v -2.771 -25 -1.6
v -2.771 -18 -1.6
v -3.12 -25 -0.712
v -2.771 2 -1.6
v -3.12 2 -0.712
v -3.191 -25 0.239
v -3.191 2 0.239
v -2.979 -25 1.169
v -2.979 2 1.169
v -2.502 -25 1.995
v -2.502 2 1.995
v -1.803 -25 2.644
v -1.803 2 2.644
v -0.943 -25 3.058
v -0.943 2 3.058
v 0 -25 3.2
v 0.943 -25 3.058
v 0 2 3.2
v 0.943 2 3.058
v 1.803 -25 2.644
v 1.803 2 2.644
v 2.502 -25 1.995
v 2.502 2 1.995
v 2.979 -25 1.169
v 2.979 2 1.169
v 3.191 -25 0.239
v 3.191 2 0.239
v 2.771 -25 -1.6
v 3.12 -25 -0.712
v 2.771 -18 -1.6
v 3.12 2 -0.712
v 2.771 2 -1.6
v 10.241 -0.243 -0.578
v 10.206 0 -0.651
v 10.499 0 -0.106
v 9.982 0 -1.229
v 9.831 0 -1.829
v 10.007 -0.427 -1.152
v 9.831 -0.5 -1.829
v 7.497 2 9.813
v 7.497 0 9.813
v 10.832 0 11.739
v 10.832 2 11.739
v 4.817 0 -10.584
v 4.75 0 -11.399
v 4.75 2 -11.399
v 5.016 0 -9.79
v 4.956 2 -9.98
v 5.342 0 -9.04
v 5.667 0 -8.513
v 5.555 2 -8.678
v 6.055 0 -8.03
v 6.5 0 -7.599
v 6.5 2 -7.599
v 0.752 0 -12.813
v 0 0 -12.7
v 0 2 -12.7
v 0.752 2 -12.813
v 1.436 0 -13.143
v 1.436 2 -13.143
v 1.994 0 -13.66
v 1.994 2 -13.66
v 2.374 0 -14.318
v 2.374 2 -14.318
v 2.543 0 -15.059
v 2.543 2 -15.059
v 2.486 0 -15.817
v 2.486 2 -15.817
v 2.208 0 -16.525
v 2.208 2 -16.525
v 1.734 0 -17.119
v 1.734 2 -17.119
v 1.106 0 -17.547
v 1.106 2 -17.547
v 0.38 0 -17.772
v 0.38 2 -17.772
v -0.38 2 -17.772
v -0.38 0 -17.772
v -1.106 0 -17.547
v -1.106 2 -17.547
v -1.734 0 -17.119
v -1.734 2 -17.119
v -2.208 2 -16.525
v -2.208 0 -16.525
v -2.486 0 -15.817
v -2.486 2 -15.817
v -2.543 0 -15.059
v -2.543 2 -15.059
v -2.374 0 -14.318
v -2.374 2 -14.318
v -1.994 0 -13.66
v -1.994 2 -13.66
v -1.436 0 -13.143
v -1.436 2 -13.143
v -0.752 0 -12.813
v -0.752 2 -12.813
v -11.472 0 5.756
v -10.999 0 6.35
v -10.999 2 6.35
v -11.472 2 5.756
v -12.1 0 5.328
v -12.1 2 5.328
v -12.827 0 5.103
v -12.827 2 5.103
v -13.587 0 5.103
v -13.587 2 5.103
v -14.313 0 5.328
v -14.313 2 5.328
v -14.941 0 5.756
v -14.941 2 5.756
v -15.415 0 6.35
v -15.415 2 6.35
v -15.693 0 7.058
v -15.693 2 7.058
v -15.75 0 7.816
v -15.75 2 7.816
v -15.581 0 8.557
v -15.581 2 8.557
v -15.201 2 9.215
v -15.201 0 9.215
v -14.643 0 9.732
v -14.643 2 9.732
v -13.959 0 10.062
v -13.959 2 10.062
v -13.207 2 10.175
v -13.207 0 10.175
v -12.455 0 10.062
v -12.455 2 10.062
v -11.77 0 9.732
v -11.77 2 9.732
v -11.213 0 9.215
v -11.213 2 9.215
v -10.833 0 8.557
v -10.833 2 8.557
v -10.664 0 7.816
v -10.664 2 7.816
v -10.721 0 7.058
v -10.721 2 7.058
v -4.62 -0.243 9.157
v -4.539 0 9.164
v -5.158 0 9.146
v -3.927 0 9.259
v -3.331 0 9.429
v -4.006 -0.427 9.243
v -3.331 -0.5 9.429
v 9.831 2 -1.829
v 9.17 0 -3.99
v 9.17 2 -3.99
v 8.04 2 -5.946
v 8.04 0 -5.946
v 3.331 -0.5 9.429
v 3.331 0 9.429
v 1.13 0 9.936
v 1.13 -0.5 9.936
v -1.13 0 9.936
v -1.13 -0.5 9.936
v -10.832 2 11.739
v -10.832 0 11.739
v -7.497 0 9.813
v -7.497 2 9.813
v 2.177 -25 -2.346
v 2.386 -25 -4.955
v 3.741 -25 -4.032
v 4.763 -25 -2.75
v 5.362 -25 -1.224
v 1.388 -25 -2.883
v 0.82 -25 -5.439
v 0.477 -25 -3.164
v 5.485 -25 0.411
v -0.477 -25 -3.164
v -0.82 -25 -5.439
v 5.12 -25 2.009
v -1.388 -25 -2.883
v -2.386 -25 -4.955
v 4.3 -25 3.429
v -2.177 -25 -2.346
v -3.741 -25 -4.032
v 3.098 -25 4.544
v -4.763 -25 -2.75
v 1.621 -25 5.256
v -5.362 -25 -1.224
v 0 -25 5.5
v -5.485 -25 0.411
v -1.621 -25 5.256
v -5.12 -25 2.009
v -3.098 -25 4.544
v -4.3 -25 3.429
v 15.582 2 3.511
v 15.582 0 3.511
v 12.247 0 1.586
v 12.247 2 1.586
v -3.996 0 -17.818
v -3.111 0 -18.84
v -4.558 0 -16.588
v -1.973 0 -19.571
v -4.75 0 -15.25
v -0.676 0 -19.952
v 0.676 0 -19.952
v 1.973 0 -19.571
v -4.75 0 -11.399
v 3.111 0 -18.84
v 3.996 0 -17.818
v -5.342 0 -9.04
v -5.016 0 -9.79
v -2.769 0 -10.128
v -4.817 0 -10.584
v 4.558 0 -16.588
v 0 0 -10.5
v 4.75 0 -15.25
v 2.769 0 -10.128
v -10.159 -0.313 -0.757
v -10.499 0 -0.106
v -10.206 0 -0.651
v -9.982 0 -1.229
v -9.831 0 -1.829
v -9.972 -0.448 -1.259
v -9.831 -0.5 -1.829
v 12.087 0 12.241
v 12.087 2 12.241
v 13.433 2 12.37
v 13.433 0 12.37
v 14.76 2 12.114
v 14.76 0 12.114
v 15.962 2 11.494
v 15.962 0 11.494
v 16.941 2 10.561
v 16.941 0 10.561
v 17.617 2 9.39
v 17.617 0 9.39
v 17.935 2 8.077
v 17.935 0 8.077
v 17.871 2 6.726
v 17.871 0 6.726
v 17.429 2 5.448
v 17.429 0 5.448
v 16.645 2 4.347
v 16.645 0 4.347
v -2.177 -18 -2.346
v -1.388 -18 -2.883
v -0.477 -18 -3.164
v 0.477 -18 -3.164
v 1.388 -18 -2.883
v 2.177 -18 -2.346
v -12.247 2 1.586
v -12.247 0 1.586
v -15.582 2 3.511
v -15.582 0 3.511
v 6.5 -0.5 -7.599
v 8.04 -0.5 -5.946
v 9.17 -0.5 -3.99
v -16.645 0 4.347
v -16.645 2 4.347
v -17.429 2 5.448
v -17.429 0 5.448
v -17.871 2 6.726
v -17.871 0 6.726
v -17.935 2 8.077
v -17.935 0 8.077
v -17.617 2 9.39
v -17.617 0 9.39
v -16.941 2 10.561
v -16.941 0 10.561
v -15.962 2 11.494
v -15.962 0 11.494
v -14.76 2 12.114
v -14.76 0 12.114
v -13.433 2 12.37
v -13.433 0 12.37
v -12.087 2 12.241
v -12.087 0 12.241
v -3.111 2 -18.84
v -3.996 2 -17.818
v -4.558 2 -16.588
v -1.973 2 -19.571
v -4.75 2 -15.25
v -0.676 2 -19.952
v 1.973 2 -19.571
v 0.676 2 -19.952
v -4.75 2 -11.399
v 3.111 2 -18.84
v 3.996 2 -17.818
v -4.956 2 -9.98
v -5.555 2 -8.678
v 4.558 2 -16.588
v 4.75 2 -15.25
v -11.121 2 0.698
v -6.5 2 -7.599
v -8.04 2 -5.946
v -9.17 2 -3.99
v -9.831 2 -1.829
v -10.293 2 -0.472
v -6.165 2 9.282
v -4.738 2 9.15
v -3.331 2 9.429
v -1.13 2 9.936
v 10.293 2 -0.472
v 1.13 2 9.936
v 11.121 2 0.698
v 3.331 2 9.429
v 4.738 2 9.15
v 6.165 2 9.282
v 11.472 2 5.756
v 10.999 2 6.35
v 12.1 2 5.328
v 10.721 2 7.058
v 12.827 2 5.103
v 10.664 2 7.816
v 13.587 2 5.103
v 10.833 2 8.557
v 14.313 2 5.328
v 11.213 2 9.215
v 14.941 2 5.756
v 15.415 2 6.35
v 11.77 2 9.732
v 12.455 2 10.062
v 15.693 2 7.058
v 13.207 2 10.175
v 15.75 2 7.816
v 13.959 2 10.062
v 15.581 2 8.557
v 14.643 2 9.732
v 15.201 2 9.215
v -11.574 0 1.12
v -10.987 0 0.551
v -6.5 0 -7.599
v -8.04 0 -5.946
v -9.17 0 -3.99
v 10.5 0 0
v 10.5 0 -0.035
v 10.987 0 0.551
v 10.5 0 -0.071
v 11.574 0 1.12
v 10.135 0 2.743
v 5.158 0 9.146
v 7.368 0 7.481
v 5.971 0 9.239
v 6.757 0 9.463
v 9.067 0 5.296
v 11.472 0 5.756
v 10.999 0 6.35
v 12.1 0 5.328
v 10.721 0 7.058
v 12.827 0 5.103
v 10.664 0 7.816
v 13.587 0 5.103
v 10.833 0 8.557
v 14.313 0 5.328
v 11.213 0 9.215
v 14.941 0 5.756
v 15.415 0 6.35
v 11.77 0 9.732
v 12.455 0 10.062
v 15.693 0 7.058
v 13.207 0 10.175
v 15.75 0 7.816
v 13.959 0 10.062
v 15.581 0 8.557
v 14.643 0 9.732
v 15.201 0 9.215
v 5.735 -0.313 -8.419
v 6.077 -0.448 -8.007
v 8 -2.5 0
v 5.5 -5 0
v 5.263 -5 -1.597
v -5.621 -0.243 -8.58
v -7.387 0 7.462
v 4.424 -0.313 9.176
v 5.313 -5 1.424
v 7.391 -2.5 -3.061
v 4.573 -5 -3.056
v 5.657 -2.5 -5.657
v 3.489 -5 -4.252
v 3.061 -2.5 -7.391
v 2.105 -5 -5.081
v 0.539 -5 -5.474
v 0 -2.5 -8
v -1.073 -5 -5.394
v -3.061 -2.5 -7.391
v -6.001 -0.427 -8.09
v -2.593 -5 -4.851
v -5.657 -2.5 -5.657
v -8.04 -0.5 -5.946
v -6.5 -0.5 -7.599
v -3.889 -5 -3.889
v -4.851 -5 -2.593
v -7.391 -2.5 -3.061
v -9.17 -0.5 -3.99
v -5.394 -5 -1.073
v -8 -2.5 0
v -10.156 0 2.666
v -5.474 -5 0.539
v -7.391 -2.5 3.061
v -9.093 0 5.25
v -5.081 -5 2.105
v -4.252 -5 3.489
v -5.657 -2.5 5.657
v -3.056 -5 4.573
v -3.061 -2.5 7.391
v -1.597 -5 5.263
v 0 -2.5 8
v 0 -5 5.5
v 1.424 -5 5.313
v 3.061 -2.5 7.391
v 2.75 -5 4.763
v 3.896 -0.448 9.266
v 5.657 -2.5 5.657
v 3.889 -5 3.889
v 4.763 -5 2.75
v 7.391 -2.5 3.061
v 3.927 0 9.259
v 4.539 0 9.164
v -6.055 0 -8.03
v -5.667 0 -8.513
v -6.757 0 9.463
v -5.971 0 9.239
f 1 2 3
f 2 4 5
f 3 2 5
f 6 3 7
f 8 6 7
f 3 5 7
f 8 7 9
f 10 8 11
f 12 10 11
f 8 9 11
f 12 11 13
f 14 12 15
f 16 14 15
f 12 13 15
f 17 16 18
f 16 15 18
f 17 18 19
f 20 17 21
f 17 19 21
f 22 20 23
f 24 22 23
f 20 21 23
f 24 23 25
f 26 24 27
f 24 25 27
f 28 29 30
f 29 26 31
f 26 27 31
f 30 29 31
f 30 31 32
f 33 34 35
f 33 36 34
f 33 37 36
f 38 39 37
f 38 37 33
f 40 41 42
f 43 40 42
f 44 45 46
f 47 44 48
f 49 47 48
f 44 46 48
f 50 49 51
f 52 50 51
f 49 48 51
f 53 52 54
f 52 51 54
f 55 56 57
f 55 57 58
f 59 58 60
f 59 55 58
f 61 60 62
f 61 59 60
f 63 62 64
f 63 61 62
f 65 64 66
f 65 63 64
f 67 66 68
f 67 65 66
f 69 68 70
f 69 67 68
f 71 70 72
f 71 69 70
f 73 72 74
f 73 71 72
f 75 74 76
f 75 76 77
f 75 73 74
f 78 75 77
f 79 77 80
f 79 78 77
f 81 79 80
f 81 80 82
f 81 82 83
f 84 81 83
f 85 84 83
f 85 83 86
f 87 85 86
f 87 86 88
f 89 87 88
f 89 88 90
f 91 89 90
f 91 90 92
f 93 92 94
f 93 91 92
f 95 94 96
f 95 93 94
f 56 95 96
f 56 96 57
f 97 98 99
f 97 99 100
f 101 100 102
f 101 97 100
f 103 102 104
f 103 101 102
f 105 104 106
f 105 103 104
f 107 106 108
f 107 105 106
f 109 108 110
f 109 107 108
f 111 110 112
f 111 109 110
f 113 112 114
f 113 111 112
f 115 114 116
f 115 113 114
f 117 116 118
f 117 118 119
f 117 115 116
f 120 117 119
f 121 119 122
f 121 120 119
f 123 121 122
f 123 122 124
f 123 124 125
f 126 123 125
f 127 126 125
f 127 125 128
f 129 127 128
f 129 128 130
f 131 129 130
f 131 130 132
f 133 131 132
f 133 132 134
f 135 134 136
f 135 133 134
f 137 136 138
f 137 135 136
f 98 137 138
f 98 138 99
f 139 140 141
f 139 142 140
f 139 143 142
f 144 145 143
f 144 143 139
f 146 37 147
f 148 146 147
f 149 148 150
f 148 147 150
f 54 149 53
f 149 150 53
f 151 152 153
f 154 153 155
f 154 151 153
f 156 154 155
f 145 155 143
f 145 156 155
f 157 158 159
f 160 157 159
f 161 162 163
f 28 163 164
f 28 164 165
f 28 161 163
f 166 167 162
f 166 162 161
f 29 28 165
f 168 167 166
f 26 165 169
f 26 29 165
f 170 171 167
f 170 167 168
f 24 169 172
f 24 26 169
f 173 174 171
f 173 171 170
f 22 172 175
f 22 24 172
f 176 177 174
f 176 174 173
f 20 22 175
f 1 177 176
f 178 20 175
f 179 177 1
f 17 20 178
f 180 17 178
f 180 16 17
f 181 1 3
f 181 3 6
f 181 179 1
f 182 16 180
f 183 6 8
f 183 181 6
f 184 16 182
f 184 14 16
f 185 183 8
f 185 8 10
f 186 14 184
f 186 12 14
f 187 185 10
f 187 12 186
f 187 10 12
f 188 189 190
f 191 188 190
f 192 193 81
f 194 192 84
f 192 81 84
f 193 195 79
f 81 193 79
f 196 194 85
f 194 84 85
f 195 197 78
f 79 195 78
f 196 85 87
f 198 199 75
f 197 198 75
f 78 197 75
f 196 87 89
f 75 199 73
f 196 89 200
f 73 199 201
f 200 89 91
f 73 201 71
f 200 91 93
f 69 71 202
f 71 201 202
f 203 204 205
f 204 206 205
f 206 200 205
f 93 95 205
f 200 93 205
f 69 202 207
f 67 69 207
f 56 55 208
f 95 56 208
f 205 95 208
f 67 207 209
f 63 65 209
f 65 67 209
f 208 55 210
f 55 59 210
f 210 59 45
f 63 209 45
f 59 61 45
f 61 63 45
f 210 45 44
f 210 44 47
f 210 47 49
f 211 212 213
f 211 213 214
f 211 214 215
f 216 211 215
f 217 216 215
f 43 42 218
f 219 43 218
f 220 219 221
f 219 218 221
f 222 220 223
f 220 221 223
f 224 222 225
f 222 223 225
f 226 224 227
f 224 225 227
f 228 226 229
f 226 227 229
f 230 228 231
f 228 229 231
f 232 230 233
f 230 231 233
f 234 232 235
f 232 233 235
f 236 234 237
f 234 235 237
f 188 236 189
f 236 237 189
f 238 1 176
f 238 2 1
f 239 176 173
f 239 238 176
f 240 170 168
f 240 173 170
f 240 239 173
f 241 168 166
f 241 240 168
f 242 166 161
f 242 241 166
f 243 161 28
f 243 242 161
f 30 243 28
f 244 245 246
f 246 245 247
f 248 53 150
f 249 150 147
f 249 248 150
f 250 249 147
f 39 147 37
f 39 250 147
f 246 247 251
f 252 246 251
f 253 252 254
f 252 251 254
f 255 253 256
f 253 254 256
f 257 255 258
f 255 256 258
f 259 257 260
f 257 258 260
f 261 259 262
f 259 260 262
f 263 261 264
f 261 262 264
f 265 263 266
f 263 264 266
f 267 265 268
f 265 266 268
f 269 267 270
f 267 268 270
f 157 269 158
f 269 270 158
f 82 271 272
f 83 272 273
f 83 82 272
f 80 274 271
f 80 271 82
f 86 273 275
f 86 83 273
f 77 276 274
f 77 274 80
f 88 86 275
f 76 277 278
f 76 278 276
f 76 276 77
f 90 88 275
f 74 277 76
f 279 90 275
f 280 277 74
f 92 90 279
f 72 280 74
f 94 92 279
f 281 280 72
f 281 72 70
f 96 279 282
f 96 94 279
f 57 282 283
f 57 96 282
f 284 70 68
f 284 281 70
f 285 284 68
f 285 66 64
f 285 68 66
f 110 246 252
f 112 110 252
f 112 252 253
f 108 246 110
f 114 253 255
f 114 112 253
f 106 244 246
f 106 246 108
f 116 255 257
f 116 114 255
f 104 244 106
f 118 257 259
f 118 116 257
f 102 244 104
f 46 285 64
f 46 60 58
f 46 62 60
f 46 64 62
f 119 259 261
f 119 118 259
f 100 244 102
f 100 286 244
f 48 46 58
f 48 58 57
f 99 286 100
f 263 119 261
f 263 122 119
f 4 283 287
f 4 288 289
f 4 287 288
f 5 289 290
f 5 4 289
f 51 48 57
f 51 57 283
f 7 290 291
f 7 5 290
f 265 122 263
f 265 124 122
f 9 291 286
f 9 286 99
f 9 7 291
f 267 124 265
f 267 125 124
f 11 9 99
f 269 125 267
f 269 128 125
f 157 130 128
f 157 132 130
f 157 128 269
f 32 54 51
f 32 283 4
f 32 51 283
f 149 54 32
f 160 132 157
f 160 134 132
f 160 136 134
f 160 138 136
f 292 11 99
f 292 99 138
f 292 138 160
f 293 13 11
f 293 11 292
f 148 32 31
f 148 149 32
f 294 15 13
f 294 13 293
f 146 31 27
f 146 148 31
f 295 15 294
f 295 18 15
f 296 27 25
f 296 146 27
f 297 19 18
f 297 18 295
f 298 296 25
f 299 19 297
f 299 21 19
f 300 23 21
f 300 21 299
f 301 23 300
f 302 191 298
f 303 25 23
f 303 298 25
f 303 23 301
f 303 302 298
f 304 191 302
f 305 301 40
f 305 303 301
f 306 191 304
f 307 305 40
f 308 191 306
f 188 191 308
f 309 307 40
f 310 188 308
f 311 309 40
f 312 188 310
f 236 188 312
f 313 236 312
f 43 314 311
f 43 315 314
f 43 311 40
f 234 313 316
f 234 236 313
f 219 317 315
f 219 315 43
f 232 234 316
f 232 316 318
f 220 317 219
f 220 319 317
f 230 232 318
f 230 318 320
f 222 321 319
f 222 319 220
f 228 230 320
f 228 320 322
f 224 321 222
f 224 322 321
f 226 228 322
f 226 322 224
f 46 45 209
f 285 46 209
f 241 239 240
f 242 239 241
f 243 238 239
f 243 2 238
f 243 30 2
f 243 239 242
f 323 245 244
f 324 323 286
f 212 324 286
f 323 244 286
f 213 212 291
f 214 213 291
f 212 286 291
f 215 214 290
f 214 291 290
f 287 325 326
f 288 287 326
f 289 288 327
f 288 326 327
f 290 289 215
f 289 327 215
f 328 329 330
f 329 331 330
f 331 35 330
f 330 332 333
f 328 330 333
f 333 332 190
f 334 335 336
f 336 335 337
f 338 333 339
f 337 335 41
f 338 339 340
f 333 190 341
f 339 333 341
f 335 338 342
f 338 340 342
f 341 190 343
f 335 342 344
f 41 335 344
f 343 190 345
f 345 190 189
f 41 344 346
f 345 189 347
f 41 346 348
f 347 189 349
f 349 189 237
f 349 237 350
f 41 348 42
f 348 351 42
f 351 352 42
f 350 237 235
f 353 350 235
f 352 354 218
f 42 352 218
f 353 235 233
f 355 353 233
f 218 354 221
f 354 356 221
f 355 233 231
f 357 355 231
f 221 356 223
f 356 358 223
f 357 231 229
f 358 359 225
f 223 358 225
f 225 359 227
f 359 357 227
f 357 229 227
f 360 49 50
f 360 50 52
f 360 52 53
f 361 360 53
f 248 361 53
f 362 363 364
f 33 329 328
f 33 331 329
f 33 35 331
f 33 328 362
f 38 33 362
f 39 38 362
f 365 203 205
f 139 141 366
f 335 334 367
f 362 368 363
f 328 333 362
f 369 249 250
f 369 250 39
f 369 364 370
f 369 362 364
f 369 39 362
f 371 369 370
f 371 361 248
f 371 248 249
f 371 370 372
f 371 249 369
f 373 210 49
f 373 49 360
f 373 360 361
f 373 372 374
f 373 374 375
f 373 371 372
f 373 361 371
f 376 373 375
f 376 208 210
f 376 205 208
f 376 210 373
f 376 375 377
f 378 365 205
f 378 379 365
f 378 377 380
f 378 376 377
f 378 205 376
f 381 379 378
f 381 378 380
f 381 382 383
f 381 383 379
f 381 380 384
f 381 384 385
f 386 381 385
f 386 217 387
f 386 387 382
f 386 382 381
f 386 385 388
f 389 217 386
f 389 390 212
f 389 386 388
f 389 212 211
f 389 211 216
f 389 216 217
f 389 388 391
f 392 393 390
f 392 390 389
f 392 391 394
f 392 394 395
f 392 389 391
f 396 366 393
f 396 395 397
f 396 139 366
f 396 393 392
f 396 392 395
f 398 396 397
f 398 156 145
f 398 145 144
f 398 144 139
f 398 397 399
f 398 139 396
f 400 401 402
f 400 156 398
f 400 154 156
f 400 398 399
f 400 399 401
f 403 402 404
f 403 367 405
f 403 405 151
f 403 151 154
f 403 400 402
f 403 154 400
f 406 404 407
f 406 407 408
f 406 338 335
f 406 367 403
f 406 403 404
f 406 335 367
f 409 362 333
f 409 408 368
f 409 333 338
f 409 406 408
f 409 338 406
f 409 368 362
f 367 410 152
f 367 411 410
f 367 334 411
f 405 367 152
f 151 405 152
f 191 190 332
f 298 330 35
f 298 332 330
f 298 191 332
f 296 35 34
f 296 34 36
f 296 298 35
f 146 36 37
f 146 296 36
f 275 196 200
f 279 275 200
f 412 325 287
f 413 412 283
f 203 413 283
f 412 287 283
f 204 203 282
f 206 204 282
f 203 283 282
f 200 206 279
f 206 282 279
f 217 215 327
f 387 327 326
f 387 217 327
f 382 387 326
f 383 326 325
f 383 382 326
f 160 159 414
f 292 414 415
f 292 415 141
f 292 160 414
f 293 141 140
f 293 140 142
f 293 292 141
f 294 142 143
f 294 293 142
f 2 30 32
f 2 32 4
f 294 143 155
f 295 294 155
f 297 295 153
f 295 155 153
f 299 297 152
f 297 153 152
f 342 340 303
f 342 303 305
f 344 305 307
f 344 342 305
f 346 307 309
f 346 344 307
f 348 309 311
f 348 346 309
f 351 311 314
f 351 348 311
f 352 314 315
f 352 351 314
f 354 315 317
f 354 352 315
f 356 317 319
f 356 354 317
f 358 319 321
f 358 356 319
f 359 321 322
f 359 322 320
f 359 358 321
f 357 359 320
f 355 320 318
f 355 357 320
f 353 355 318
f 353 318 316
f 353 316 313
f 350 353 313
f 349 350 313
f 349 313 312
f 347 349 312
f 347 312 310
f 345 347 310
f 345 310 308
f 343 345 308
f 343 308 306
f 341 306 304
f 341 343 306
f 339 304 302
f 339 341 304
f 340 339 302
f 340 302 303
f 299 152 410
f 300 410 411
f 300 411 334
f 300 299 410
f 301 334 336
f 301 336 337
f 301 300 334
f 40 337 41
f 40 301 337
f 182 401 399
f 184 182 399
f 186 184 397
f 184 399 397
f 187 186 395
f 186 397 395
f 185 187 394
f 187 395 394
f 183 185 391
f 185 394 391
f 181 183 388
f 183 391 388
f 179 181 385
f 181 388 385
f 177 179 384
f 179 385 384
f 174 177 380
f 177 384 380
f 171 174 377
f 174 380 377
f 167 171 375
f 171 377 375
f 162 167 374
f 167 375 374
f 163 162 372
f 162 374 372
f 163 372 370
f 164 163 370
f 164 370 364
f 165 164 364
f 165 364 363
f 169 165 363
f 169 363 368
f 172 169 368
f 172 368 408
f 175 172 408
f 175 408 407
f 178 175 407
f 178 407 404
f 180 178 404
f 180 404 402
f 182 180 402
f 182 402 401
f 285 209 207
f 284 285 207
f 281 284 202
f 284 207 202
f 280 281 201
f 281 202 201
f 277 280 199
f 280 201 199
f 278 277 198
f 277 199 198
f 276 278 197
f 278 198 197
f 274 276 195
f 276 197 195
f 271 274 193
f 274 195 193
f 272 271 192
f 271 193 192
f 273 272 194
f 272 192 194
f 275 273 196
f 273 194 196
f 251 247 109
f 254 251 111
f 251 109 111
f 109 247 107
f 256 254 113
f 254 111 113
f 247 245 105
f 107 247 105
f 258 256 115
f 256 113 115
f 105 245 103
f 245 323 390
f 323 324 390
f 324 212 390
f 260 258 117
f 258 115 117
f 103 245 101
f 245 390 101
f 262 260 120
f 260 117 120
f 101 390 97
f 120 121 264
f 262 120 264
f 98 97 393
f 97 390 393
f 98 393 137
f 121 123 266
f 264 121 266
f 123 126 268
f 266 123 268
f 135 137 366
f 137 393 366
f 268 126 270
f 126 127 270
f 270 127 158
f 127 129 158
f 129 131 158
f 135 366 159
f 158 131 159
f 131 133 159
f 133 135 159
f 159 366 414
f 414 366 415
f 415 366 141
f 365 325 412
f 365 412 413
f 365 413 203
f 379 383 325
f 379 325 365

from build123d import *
from build123d.topology import SkipClean

# Parameters (mm, degrees)
SKETCH1_R               = 10
BOSS_EXTRUDE1_DEPTH     = 2
BOSS_EXTRUDE2_START     = -2
SKETCH2_R               = 2.55
BOSS_EXTRUDE2_DEPTH     = 2
CIRPATTERN1_COUNT       = 3
CUT_EXTRUDE1_DEPTH      = 27.9527328
SKETCH4_R               = 5.5
BOSS_EXTRUDE3_DEPTH     = 25
CUT_EXTRUDE2_START      = -7
SKETCH5_R               = 3
CUT_EXTRUDE2_DEPTH      = 7
CUT_EXTRUDE3_DEPTH      = 34.502982037
CUT_EXTRUDE3_DEPTH_BACK = 34.502982037
CUT_EXTRUDE4_START      = -7
SKETCH8_R               = 3.2
CUT_EXTRUDE4_DEPTH      = 7
FILLET2_R               = 5
CHAMFER1_START          = -2
CHAMFER1_2_DEPTH        = 2


with BuildPart() as part:
    # Sketch1 → Boss-Extrude1 (new body)
    with BuildSketch(Plane(origin=(0, 0, 0), x_dir=(1, 0, 0), z_dir=(0, 1, 0))):
        with Locations(Location((0, 0, 0), (0, 0, 270))):
            Circle(SKETCH1_R)
    extrude(amount=BOSS_EXTRUDE1_DEPTH)

    # Sketch2 → Boss-Extrude2 (add)
    with BuildSketch(Plane(origin=(0, 2, 0), x_dir=(1, 0, 0), z_dir=(0, 1, 0)).offset(BOSS_EXTRUDE2_START)):
        with BuildLine():
            Line((-4.75, 15.25), (-4.75, 8.799857953))
            ThreePointArc((-4.75, 8.799857953), (0, 10), (4.75, 8.799857953))
            Line((4.75, 8.799857953), (4.75, 15.25))
            ThreePointArc((4.75, 15.25), (0, 20), (-4.75, 15.25))
        make_face()
        with Locations(Location((0, 15.25, 0), (0, 0, 270))):
            Circle(SKETCH2_R, mode=Mode.SUBTRACT)
    boss_extrude2 = extrude(amount=BOSS_EXTRUDE2_DEPTH)

    # CirPattern1: Boss-Extrude2 ×3 about axis
    cirpattern1_axis = Axis((0, 0, 0), (0, 1, 0))
    for i in range(1, CIRPATTERN1_COUNT):
        add(boss_extrude2.rotate(cirpattern1_axis, i * 360 / CIRPATTERN1_COUNT))

    # Sketch3 → Cut-Extrude1 (cut, through all)
    with BuildSketch(Plane(origin=(0, 2, 0), x_dir=(1, 0, 0), z_dir=(0, 1, 0))):
        with BuildLine():
            Line((-2.653299832, 1.4), (2.653299832, 1.4))
            ThreePointArc((2.653299832, 1.4), (0, -3), (-2.653299832, 1.4))
        make_face()
    extrude(amount=-CUT_EXTRUDE1_DEPTH, mode=Mode.SUBTRACT)

    # Sketch4 → Boss-Extrude3 (add)
    with SkipClean():  # the faces are left unmerged after this step: merging them gives an invalid solid
        with BuildSketch(Plane.XZ):
            with Locations(Location((0, 0, 0), (0, 0, 90))):
                Circle(SKETCH4_R)
            with BuildLine():
                Line((2.653299832, -1.4), (-2.653299832, -1.4))
                ThreePointArc((-2.653299832, -1.4), (0, 3), (2.653299832, -1.4))
            make_face(mode=Mode.SUBTRACT)
        extrude(amount=BOSS_EXTRUDE3_DEPTH)

    # Sketch5 → Cut-Extrude2 (cut)
    with SkipClean():  # the faces are left unmerged after this step: merging them gives an invalid solid
        with BuildSketch(Plane.XZ.offset(25).offset(CUT_EXTRUDE2_START)):
            with Locations(Location((0, 0, 0), (0, 0, 332.181860715))):
                Circle(SKETCH5_R)
        extrude(amount=CUT_EXTRUDE2_DEPTH, mode=Mode.SUBTRACT)

    # Sketch7 → Cut-Extrude3 (cut, two sides: drawn at the far end of the back side and taken through both)
    with BuildSketch(Plane.XZ.offset(18).offset(-CUT_EXTRUDE3_DEPTH_BACK)):
        with BuildLine():
            Line((2.771281292, -1.6), (-2.771281292, -1.6))
            ThreePointArc((-2.771281292, -1.6), (0, 3.2), (2.771281292, -1.6))
        make_face()
        with BuildLine():
            Line((2.653299832, -1.4), (-2.653299832, -1.4))
            ThreePointArc((-2.653299832, -1.4), (0, 3), (2.653299832, -1.4))
        make_face(mode=Mode.SUBTRACT)
    extrude(amount=CUT_EXTRUDE3_DEPTH + CUT_EXTRUDE3_DEPTH_BACK, mode=Mode.SUBTRACT)

    # Sketch8 → Cut-Extrude4 (cut)
    with BuildSketch(Plane.XZ.offset(25).offset(CUT_EXTRUDE4_START)):
        with Locations(Location((0, 0, 0), (0, 0, 270))):
            Circle(SKETCH8_R)
    extrude(amount=CUT_EXTRUDE4_DEPTH, mode=Mode.SUBTRACT)

    # Fillet2
    fillet2_edges = [part.edges().sort_by_distance(p)[0] for p in [
        (9.995900537, 1, 0.286308309),
        (5.245900537, 1, 8.513549645),
        (-5.245900537, 1, 8.513549645),
        (-9.995900537, 1, 0.286308309),
        (-4.75, 1, -8.799857953),
        (4.75, 1, -8.799857953),
    ]]
    fillet(fillet2_edges, radius=FILLET2_R)

    # Chamfer1: read off the stored shape, not the designer's step
    # Chamfer1 outline → Chamfer1 (revolve)
    with BuildSketch(Plane.XY):
        Polygon((5.5, 0), (5.5, -5), (10.5, 0), align=None)
    revolve(axis=Axis((0, 0, 0), (0, 1, 0)))

    # Chamfer1 2 outline → Chamfer1 2 (cut)
    with BuildSketch(Plane(origin=(0, 0, 0), x_dir=(1, 0, 0), z_dir=(0, 1, 0)).offset(CHAMFER1_START)):
        with BuildLine():
            ThreePointArc((7.496834936, -9.813127226), (5.456150608, -9.164396031), (3.331223291, -9.428836163))
            ThreePointArc((3.331223291, -9.428836163), (0, -10), (-3.331223291, -9.428836163))
            ThreePointArc((-3.331223291, -9.428836163), (-5.456150608, -9.164396031), (-7.496834936, -9.813127226))
            Line((-7.496834936, -9.813127226), (-11.28460969, -12))
            Line((-11.28460969, -12), (11.28460969, -12))
            Line((11.28460969, -12), (7.496834936, -9.813127226))
        make_face()
        with BuildLine():
            ThreePointArc((9.831223291, 1.829494086), (10.582663547, -0.023370954), (12, -1.433664786))
            Line((12, -1.433664786), (12, 11))
            Line((12, 11), (4.765946576, 11))
            ThreePointArc((4.765946576, 11), (5.295673168, 9.12767596), (6.5, 7.599342077))
            ThreePointArc((6.5, 7.599342077), (8.660254038, 5), (9.831223291, 1.829494086))
        make_face()
        with BuildLine():
            Line((-12, 11), (-12, -1.433664786))
            ThreePointArc((-12, -1.433664786), (-10.582663547, -0.023370954), (-9.831223291, 1.829494086))
            ThreePointArc((-9.831223291, 1.829494086), (-8.660254038, 5), (-6.5, 7.599342077))
            ThreePointArc((-6.5, 7.599342077), (-5.295673168, 9.12767596), (-4.765946576, 11))
            Line((-4.765946576, 11), (-12, 11))
        make_face()
    extrude(amount=CHAMFER1_2_DEPTH, mode=Mode.SUBTRACT)


solid = part.part
